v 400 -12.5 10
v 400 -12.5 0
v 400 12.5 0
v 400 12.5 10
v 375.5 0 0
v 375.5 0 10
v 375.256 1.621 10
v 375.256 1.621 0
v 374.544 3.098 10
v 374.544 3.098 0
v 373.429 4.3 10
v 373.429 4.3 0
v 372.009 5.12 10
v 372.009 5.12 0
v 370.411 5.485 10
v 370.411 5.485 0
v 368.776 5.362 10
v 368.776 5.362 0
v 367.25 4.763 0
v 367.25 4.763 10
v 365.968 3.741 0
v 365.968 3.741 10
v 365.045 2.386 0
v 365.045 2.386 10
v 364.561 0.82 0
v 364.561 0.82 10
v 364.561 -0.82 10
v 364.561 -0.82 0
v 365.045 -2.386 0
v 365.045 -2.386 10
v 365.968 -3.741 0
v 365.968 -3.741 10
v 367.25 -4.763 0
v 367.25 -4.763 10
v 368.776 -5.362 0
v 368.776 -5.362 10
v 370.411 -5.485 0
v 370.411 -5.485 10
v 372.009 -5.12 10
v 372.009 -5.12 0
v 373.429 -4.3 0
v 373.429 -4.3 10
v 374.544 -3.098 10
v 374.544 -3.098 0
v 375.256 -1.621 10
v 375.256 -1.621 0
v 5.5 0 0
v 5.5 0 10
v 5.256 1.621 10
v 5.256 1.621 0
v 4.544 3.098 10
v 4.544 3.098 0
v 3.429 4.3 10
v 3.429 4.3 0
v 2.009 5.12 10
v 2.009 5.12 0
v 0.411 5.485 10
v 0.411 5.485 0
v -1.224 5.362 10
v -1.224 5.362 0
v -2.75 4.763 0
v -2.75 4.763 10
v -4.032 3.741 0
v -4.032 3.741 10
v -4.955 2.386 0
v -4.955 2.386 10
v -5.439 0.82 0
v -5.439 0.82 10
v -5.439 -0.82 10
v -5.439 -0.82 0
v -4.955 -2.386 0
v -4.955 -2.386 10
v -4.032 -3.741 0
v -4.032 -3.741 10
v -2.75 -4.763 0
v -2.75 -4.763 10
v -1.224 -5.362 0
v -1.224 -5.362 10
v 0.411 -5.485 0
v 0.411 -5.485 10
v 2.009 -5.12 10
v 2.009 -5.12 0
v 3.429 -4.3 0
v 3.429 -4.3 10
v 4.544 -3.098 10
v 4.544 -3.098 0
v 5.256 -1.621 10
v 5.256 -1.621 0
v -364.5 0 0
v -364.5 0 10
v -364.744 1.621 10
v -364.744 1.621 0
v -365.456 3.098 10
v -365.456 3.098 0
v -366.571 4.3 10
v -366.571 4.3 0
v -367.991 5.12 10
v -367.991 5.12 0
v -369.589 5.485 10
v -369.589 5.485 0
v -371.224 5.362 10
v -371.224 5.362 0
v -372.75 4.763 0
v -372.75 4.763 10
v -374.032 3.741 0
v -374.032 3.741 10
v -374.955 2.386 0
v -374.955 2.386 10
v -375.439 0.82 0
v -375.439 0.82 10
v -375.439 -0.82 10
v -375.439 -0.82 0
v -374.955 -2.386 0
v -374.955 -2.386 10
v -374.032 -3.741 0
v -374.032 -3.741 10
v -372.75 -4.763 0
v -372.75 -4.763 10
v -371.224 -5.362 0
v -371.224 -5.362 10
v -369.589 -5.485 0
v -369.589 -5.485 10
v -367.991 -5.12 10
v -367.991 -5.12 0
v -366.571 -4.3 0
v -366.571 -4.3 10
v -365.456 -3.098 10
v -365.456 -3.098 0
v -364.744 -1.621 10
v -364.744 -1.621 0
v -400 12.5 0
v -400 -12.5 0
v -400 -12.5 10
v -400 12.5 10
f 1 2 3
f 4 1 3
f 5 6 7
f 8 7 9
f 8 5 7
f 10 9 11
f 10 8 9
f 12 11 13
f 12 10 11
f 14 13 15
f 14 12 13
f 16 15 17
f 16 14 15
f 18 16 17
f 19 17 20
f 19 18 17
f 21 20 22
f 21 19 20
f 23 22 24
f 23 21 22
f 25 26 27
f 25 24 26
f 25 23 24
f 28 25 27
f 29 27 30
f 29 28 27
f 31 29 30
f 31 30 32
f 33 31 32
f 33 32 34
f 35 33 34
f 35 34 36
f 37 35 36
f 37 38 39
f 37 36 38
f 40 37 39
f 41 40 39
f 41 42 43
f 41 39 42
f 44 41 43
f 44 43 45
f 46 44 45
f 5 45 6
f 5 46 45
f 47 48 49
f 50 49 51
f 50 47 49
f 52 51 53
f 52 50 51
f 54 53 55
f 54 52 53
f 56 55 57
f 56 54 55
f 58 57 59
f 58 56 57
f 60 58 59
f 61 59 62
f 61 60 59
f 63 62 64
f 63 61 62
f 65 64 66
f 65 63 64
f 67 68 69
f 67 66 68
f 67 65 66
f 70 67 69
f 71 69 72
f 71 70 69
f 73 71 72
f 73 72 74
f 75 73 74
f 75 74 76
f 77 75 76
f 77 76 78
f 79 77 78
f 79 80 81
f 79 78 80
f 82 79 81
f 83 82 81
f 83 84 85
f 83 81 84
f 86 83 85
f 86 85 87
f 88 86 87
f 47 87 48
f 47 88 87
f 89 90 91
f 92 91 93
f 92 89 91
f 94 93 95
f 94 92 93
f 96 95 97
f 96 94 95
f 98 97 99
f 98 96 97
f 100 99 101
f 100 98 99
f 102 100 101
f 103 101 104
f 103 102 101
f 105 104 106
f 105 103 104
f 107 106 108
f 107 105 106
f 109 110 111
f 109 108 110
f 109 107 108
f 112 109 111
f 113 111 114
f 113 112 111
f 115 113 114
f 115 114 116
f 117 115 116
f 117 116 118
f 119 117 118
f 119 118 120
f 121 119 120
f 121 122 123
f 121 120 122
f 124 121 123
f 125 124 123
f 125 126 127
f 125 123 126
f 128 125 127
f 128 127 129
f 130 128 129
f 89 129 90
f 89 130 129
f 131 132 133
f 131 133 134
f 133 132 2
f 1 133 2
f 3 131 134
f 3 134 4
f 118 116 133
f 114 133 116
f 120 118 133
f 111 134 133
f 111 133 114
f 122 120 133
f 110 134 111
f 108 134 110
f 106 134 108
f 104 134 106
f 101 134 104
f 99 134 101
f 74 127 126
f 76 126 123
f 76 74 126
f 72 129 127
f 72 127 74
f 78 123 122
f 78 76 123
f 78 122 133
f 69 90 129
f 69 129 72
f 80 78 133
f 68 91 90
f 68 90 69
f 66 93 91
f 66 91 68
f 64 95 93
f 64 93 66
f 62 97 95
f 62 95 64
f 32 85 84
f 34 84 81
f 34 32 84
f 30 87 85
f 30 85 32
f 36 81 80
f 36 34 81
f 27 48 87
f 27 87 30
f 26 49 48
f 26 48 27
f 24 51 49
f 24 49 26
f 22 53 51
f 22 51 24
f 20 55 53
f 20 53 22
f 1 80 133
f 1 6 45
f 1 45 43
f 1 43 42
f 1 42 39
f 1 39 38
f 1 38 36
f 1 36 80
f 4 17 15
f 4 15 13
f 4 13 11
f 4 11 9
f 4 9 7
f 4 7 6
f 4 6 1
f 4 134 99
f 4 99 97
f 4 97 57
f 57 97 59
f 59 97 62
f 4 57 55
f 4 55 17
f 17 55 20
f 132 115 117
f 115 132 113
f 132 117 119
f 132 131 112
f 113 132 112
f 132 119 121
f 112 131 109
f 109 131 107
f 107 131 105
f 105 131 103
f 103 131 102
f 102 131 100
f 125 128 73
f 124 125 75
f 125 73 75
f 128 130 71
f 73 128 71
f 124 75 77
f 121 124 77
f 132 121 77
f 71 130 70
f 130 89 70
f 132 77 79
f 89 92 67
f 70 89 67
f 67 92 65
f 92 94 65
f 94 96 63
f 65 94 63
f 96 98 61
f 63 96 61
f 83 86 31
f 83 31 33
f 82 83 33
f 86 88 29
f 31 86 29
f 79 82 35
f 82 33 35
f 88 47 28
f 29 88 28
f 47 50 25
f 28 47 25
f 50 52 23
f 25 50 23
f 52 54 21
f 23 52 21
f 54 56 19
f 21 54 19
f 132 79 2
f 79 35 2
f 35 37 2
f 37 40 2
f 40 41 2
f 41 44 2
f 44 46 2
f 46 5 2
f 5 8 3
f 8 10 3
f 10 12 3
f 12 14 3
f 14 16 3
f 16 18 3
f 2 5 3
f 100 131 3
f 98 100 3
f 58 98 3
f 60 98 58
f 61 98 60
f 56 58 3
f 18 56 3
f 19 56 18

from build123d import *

# Parameters (mm, degrees)
SKETCH1_W           = 800
SKETCH1_H           = 25
BOSS_EXTRUDE1_DEPTH = 10
SKETCH2_R           = 5.5
CUT_EXTRUDE1_DEPTH  = 20


with BuildPart() as part:
    # Sketch1 → Boss-Extrude1 (new body)
    with BuildSketch(Plane.XY):
        Rectangle(SKETCH1_W, SKETCH1_H)
    extrude(amount=BOSS_EXTRUDE1_DEPTH)

    # Sketch2 → Cut-Extrude1 (cut)
    with BuildSketch(Plane.XY):
        with Locations((370, 0)):
            Circle(SKETCH2_R)
        with Locations((-370, 0)):
            Circle(SKETCH2_R)
        Circle(SKETCH2_R)
    extrude(amount=CUT_EXTRUDE1_DEPTH, mode=Mode.SUBTRACT)


solid = part.part
